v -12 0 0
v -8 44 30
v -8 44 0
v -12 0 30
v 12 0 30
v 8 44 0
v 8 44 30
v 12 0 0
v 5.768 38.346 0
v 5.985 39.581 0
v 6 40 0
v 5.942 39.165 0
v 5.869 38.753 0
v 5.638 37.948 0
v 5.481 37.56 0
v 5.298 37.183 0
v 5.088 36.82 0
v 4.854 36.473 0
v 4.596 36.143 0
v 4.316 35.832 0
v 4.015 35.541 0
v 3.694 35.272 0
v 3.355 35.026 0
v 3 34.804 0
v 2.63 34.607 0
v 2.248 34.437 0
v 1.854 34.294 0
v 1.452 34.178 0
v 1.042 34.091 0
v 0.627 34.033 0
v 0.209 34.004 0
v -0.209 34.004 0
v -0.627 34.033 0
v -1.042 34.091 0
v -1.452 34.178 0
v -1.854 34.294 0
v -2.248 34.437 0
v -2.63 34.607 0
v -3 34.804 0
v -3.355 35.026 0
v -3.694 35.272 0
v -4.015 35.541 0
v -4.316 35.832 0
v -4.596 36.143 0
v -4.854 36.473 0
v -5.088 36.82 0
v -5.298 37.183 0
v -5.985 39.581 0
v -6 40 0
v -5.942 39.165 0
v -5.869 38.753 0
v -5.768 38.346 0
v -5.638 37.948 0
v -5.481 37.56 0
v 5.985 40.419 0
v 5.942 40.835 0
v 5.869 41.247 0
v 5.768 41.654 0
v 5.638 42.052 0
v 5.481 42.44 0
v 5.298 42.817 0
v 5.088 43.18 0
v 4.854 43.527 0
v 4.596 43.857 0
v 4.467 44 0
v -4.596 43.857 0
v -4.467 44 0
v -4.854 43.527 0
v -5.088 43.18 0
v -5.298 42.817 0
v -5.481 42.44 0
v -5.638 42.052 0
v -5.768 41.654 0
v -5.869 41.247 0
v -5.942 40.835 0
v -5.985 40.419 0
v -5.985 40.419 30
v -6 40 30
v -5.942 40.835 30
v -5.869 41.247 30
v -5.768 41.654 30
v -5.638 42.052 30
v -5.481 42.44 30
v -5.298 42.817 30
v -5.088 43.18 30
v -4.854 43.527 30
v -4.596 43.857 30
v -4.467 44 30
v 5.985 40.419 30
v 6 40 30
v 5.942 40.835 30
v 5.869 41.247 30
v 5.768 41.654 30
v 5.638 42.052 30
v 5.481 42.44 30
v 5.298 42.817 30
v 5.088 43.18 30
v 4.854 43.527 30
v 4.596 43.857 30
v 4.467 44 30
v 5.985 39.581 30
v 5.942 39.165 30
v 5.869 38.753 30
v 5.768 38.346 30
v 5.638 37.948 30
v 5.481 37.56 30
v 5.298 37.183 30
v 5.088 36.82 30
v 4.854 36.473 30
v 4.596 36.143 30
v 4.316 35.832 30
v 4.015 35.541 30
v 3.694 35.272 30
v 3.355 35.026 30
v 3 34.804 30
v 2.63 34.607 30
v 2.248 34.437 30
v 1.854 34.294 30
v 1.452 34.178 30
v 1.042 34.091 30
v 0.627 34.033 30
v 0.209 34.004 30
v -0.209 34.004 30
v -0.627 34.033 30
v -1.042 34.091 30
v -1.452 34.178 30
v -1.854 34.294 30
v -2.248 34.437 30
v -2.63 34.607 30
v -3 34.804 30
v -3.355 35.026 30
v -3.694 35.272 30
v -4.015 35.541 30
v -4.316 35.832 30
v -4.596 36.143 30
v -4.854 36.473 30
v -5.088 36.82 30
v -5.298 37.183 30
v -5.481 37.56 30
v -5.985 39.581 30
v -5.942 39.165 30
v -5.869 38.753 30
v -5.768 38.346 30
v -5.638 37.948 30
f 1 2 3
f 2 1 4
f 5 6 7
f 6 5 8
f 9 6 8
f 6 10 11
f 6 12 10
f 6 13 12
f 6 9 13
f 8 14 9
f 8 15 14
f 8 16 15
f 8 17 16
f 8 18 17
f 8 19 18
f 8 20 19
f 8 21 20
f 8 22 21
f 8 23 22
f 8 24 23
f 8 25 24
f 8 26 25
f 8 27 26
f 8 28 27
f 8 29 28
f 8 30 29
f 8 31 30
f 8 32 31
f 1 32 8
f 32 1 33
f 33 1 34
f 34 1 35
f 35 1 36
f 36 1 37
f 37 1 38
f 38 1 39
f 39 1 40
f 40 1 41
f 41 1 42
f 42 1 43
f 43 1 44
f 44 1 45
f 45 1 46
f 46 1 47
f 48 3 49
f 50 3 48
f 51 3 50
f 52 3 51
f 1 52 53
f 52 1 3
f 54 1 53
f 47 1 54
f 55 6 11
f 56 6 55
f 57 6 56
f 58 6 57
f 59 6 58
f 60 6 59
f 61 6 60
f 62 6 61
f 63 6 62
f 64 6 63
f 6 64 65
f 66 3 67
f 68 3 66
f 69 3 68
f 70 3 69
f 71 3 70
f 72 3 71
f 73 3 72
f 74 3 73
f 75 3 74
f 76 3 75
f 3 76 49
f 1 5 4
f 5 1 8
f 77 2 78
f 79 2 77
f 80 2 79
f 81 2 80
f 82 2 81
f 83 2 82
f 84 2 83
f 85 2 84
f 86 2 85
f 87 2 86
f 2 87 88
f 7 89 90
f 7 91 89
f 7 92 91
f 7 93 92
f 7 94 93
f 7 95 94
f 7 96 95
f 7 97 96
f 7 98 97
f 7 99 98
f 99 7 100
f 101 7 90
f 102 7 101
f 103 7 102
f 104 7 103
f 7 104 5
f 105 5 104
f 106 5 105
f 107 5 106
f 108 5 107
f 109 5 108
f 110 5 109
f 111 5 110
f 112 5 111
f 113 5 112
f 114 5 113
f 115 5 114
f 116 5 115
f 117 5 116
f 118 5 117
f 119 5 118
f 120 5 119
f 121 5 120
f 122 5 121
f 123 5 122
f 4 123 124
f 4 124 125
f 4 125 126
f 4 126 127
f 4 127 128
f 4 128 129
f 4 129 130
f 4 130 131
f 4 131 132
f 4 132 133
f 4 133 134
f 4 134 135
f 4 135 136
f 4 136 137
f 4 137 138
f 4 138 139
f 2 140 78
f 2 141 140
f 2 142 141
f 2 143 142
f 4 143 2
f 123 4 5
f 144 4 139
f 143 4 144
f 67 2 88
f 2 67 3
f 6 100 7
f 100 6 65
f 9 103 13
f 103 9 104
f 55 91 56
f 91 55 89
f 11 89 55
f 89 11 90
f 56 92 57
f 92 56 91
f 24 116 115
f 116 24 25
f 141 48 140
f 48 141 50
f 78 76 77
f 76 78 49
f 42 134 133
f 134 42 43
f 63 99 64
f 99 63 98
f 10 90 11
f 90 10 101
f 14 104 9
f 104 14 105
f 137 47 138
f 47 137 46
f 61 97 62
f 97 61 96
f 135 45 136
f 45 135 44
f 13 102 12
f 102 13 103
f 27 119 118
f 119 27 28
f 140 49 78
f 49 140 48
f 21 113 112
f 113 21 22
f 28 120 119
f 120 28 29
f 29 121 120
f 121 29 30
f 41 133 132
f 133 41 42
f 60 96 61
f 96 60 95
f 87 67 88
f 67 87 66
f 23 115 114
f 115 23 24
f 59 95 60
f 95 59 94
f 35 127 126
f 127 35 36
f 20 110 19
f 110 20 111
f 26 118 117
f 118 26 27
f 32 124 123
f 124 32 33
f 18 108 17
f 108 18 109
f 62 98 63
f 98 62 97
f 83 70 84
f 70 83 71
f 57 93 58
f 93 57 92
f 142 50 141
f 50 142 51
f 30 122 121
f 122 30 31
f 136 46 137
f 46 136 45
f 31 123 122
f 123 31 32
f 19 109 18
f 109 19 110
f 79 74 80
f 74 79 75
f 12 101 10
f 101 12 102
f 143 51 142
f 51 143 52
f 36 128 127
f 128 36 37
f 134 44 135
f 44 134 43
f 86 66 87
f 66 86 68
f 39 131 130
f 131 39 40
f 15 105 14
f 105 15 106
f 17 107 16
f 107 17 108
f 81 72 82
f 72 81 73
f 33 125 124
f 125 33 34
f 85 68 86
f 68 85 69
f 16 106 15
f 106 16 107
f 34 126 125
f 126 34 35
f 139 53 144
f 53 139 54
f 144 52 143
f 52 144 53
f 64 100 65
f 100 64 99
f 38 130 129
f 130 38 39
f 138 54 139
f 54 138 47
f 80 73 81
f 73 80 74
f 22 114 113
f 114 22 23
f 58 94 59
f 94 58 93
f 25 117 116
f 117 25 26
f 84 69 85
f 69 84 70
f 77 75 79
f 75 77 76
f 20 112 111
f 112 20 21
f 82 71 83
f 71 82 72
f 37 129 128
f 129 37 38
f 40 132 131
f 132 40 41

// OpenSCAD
$fn = 90;
depth = 30;
width = 44;

difference() {
	base();
	translate([0, 40, 0])
		cylinder(d=12, h=depth);
}

module base() {
	linear_extrude(depth) {
		base_2d_half();
		mirror([1,0,0]) base_2d_half();
	}
}
	
module base_2d_half() {
	polygon([[0,0], [12,0], [8,width], [0,width]]);
}
